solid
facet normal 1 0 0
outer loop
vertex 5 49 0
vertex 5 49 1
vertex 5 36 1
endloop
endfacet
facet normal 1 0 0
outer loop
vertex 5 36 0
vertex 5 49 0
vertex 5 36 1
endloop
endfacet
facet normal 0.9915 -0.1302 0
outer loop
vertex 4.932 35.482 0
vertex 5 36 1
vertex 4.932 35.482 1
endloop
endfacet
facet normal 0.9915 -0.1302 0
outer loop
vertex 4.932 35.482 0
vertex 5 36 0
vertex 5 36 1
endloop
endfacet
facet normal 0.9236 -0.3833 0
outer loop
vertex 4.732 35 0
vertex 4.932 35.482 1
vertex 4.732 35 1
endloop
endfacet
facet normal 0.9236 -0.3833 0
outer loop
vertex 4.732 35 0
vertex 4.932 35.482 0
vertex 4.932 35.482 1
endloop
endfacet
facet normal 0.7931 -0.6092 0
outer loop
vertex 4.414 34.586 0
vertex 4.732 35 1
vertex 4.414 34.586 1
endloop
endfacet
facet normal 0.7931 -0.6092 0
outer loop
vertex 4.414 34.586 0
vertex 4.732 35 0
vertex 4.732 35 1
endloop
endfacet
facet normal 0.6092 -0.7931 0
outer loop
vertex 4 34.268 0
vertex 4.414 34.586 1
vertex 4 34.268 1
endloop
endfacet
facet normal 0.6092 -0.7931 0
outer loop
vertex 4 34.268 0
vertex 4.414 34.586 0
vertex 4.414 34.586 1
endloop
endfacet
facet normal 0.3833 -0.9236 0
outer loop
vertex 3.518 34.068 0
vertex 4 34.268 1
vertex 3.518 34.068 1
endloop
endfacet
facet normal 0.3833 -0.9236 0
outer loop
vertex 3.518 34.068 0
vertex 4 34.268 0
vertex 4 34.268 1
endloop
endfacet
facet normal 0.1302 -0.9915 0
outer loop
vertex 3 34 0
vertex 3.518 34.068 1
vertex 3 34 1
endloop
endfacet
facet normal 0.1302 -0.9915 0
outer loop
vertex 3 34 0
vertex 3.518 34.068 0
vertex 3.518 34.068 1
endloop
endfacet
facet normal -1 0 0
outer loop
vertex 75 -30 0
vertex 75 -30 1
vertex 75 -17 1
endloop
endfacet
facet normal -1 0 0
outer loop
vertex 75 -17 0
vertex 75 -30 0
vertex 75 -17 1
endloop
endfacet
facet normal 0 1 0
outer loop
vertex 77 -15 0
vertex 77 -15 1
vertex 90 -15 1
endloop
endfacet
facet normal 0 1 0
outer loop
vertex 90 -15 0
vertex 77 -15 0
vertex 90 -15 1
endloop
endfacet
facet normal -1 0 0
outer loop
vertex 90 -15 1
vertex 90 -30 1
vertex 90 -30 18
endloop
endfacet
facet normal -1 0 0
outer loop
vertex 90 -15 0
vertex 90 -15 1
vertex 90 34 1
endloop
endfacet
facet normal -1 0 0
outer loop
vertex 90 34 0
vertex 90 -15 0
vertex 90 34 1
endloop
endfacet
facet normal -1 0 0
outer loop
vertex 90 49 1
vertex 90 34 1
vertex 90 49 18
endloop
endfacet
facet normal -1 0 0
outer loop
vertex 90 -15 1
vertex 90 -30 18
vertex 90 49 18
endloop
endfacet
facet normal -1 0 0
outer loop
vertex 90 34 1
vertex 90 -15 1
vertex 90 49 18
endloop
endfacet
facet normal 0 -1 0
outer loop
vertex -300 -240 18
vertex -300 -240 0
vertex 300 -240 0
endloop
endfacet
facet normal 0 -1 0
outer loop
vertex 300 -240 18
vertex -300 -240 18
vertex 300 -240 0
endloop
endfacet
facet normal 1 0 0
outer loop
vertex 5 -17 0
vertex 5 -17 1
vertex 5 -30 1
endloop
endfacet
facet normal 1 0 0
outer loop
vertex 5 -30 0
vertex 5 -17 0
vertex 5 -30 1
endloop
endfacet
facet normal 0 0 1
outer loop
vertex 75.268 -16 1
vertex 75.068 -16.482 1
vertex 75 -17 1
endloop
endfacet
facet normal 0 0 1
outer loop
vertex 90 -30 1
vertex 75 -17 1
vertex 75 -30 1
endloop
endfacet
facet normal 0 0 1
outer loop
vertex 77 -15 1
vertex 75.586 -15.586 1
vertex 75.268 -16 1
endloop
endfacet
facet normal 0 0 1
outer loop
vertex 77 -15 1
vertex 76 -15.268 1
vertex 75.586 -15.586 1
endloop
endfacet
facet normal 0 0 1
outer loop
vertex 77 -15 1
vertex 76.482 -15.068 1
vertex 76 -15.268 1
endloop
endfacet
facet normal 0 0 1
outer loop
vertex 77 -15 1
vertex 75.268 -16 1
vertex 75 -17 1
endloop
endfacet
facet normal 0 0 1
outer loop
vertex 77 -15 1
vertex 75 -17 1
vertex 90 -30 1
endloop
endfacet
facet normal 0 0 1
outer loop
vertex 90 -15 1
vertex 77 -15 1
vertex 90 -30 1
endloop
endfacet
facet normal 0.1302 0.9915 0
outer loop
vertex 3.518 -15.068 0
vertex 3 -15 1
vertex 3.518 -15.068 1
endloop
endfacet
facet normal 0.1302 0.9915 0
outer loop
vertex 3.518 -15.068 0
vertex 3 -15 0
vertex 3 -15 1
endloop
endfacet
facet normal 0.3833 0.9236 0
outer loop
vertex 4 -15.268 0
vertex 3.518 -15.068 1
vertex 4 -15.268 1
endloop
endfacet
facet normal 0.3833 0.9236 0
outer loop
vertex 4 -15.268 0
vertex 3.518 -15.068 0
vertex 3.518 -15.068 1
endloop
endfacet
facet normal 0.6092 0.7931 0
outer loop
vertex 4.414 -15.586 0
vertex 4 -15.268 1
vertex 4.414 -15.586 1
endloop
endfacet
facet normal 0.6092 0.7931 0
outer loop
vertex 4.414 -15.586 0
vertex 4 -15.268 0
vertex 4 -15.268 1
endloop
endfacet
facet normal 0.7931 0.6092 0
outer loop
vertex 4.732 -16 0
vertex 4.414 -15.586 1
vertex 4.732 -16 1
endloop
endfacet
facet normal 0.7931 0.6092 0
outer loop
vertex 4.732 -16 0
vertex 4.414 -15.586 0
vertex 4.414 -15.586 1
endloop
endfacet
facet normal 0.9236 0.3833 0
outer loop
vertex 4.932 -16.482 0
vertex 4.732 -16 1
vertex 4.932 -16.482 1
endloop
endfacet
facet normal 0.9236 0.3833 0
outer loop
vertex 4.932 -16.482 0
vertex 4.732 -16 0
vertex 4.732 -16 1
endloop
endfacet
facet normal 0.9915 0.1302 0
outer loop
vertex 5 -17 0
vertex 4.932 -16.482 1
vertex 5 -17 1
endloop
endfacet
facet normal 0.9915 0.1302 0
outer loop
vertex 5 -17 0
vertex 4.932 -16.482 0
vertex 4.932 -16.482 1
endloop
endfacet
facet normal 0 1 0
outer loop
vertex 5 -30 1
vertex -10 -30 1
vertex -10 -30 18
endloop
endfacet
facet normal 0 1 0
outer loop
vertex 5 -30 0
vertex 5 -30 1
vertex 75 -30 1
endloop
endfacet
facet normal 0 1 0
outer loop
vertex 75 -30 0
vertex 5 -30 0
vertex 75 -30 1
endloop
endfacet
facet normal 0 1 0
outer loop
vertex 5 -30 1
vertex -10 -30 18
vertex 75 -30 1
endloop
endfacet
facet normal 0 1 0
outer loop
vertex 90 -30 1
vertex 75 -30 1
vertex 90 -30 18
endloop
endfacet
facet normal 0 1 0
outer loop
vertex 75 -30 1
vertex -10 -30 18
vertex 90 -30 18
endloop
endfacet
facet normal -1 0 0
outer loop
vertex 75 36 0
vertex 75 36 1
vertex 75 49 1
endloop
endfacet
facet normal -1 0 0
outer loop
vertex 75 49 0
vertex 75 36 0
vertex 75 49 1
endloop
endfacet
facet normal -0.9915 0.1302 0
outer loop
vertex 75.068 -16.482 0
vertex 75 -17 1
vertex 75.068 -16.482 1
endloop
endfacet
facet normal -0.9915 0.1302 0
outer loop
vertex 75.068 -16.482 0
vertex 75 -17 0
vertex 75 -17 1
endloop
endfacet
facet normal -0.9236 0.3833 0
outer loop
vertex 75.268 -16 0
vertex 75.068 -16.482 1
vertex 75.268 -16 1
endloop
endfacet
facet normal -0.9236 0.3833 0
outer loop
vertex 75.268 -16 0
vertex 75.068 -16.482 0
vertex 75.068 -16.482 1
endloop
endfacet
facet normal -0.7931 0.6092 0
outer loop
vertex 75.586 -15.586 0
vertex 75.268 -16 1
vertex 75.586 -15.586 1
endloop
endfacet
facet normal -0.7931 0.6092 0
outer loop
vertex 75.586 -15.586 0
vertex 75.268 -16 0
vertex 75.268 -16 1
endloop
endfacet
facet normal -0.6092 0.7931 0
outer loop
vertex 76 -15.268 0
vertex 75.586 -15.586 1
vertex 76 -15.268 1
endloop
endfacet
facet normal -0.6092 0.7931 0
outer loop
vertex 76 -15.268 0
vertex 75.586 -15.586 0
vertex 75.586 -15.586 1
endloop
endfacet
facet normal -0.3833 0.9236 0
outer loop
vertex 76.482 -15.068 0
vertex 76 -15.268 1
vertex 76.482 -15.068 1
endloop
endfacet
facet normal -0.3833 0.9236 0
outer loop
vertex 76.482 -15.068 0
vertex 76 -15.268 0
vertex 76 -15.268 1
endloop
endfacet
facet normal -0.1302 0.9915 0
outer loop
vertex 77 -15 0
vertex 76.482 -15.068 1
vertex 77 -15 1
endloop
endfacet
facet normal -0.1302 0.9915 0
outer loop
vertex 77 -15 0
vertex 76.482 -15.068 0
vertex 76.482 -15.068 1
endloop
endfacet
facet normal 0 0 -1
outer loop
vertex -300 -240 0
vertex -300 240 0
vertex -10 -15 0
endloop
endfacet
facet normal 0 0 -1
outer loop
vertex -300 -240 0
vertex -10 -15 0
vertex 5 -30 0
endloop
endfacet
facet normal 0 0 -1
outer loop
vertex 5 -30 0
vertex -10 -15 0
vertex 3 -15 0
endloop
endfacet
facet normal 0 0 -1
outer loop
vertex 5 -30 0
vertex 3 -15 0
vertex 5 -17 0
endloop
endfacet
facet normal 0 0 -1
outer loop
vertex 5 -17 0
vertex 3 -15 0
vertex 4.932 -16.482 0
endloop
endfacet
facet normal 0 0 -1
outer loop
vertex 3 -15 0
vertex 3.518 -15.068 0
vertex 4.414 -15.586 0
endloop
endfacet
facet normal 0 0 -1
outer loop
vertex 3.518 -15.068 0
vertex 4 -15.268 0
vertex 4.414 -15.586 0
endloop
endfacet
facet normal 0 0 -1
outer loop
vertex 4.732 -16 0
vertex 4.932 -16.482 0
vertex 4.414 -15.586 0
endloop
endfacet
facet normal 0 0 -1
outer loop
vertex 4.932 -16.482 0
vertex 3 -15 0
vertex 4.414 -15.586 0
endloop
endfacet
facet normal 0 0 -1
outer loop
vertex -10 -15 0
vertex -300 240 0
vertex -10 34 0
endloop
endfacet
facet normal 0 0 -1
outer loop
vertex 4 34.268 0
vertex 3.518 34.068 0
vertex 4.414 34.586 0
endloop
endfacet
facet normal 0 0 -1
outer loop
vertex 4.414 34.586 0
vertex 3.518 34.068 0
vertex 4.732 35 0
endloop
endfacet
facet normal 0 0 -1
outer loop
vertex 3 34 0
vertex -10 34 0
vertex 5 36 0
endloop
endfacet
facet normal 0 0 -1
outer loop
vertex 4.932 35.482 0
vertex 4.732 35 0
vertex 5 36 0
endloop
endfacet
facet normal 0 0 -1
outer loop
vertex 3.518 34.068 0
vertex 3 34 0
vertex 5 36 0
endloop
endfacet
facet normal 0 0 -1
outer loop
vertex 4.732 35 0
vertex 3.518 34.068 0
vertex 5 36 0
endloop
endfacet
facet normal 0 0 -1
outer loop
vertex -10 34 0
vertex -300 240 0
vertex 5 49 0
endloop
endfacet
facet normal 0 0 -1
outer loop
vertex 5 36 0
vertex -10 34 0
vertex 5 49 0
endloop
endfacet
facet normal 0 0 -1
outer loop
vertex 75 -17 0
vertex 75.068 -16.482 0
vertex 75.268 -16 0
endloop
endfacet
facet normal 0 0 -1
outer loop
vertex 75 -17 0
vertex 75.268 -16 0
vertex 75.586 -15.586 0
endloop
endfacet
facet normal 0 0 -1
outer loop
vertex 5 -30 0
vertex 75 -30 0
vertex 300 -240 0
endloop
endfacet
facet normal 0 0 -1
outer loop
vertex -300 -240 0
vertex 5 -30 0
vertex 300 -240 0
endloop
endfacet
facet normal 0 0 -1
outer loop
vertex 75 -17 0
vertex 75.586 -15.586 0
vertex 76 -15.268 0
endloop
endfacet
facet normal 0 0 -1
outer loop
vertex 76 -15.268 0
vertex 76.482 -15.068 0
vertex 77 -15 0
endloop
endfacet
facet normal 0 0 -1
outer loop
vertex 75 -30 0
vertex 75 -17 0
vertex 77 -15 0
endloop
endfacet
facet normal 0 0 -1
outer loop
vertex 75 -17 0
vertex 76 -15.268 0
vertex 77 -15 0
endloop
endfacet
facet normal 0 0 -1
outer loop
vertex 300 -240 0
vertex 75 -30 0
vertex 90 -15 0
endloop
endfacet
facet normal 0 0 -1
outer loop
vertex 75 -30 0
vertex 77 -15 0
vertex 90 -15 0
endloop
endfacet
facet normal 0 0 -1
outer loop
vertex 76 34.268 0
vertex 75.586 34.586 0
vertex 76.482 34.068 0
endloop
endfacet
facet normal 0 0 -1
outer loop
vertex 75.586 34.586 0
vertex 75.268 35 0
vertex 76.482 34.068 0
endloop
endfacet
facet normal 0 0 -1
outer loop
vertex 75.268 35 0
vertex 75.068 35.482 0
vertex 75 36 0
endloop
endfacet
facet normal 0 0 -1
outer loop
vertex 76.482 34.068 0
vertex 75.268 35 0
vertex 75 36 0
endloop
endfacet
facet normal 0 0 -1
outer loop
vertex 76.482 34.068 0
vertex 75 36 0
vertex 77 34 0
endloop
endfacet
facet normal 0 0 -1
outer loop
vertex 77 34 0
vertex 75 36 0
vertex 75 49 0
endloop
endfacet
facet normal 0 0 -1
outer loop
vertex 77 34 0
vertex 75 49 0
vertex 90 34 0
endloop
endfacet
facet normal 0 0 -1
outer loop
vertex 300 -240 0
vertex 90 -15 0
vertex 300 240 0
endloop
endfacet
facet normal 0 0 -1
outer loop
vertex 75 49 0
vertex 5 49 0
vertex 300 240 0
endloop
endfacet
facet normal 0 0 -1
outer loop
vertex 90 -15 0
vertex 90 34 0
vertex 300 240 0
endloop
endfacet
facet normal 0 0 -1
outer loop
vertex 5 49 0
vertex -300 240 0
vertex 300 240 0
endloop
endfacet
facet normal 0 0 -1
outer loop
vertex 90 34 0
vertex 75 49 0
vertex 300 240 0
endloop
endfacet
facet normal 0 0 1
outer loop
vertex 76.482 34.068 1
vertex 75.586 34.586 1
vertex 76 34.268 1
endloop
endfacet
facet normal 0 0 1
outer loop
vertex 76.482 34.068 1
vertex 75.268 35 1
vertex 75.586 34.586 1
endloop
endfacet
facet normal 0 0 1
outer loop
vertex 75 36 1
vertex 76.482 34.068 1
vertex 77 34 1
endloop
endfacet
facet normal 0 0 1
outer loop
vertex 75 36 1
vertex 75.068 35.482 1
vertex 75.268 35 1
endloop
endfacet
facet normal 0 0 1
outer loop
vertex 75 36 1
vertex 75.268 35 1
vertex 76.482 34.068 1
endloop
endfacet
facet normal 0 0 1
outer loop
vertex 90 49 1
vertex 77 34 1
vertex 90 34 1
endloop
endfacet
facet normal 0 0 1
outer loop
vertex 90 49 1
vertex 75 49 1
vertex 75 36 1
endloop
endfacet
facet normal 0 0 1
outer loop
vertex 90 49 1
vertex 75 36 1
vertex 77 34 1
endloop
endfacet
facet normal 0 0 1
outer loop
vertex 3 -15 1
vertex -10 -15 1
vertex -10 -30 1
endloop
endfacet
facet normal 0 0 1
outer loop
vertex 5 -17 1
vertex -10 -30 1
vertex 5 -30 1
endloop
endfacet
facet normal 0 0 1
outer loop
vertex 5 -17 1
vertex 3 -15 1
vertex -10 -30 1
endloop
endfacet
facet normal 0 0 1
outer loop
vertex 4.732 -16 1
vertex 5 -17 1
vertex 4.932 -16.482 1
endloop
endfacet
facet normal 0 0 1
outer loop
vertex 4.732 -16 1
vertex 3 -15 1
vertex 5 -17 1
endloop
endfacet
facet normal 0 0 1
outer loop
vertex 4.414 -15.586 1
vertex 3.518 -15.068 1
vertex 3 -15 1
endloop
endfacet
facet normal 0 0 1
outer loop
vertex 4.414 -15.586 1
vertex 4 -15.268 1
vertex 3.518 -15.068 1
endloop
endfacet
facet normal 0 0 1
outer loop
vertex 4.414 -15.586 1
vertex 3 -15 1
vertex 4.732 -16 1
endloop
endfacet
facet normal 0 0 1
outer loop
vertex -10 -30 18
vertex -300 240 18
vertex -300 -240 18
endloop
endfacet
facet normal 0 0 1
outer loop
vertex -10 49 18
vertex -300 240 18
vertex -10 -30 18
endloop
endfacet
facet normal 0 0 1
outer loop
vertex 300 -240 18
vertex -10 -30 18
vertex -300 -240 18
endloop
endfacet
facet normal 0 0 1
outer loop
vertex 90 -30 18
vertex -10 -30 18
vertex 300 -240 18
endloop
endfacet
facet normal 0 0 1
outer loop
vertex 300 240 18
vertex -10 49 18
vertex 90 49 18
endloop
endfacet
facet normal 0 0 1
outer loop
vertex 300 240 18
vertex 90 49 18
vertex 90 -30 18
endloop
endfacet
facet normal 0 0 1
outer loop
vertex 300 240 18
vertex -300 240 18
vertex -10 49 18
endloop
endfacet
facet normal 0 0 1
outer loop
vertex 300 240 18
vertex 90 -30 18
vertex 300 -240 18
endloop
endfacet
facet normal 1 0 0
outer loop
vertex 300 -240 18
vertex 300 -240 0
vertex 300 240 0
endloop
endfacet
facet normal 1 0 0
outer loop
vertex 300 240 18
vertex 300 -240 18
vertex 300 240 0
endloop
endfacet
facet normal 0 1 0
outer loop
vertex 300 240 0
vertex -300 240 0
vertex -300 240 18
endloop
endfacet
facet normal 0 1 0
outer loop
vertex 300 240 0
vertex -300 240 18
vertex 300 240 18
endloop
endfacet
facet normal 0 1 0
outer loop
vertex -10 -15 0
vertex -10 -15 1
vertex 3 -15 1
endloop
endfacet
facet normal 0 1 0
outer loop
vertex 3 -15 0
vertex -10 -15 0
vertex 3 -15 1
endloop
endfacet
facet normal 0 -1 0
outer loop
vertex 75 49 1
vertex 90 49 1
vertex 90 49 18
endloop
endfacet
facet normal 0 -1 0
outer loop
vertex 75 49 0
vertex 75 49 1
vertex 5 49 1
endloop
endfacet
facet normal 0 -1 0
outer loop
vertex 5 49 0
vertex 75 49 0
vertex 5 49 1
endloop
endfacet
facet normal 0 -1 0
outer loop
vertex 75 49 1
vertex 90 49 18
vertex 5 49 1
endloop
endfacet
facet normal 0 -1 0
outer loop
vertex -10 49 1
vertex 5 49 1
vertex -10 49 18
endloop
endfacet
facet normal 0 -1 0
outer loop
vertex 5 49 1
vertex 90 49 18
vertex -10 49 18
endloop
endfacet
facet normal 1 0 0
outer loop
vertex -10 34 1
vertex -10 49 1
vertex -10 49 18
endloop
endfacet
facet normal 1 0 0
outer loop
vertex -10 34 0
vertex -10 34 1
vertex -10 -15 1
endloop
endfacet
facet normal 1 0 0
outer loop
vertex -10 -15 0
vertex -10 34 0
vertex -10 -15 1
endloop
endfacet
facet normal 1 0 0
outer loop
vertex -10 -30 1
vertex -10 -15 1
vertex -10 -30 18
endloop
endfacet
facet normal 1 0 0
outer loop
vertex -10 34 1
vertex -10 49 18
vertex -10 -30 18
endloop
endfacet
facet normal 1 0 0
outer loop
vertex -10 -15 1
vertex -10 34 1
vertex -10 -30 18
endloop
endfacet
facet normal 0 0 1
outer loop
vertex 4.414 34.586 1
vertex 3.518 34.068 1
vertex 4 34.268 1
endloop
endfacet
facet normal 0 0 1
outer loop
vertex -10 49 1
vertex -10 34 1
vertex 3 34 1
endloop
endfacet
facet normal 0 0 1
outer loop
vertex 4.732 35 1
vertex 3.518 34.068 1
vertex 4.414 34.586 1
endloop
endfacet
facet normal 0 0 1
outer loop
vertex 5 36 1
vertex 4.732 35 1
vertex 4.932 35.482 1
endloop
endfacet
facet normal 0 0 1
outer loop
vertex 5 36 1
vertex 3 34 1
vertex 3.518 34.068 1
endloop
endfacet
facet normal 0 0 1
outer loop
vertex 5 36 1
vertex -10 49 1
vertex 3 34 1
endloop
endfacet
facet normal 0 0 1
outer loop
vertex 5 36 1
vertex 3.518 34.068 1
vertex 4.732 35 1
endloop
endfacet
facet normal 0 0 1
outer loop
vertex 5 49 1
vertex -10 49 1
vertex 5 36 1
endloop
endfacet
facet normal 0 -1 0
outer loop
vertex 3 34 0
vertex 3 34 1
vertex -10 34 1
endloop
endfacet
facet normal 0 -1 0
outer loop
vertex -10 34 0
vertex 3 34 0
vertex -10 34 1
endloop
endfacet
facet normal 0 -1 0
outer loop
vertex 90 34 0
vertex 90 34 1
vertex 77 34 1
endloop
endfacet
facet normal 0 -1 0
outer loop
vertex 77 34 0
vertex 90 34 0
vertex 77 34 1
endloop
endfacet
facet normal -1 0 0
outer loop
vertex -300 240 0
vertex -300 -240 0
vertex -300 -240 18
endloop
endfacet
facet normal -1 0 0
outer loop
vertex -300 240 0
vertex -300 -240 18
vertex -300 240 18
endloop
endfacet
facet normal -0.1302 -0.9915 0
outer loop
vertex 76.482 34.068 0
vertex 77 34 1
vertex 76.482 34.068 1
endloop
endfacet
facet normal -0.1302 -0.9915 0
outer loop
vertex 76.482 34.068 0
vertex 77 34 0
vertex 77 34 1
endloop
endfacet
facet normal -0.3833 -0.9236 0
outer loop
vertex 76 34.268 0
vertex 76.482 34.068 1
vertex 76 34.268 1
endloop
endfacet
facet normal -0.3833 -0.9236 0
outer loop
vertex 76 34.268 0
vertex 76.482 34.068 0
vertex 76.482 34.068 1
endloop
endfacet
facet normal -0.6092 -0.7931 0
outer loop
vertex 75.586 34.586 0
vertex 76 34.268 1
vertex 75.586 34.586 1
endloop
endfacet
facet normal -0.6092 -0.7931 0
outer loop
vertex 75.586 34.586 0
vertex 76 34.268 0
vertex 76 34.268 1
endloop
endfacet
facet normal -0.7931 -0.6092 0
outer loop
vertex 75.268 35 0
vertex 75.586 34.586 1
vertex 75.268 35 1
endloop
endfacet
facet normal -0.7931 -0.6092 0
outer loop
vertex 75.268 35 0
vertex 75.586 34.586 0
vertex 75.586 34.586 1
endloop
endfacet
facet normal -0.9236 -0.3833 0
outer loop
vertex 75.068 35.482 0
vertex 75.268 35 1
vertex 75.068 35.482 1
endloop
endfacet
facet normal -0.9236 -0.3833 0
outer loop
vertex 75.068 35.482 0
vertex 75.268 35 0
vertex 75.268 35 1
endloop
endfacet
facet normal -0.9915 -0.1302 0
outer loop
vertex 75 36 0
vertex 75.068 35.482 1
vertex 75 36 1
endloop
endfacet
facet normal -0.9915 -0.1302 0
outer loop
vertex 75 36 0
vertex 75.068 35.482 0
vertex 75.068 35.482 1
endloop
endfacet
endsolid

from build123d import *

# Parameters (mm, degrees)
ESQUISSE1_W             = 600
ESQUISSE1_H             = 480
BOSS_EXTRU_1_DEPTH      = 18
ESQUISSE2_W             = 100
ESQUISSE2_H             = 79
ENL_V_MAT_EXTRU_1_DEPTH = 17
ENL_V_MAT_EXTRU_3_DEPTH = 10
CONG_1_R                = 2


with BuildPart() as part:
    # Esquisse1 → Boss.-Extru.1 (new body)
    with BuildSketch(Plane.XY):
        Rectangle(ESQUISSE1_W, ESQUISSE1_H)
    extrude(amount=BOSS_EXTRU_1_DEPTH)

    # Esquisse2 → Enlèv. mat.-Extru.1 (cut)
    with BuildSketch(Plane.XY.offset(18)):
        with Locations((40, 9.5)):
            Rectangle(ESQUISSE2_W, ESQUISSE2_H)
    extrude(amount=-ENL_V_MAT_EXTRU_1_DEPTH, mode=Mode.SUBTRACT)

    # Esquisse4 → Enlèv. mat.-Extru.3 (cut)
    with BuildSketch(Plane.XY.offset(1)):
        Polygon((75, 49), (5, 49), (5, 34), (-10, 34), (-10, -15), (5, -15), (5, -30), (75, -30), (75, -15), (90, -15), (90, 34), (75, 34), align=None)
    extrude(amount=-ENL_V_MAT_EXTRU_3_DEPTH, mode=Mode.SUBTRACT)

    # Congé1
    cong_1_edges = [part.edges().sort_by_distance(p)[0] for p in [
        (5, -15, 0.5),
        (5, 34, 0.5),
        (75, 34, 0.5),
        (75, -15, 0.5),
    ]]
    fillet(cong_1_edges, radius=CONG_1_R)


solid = part.part
